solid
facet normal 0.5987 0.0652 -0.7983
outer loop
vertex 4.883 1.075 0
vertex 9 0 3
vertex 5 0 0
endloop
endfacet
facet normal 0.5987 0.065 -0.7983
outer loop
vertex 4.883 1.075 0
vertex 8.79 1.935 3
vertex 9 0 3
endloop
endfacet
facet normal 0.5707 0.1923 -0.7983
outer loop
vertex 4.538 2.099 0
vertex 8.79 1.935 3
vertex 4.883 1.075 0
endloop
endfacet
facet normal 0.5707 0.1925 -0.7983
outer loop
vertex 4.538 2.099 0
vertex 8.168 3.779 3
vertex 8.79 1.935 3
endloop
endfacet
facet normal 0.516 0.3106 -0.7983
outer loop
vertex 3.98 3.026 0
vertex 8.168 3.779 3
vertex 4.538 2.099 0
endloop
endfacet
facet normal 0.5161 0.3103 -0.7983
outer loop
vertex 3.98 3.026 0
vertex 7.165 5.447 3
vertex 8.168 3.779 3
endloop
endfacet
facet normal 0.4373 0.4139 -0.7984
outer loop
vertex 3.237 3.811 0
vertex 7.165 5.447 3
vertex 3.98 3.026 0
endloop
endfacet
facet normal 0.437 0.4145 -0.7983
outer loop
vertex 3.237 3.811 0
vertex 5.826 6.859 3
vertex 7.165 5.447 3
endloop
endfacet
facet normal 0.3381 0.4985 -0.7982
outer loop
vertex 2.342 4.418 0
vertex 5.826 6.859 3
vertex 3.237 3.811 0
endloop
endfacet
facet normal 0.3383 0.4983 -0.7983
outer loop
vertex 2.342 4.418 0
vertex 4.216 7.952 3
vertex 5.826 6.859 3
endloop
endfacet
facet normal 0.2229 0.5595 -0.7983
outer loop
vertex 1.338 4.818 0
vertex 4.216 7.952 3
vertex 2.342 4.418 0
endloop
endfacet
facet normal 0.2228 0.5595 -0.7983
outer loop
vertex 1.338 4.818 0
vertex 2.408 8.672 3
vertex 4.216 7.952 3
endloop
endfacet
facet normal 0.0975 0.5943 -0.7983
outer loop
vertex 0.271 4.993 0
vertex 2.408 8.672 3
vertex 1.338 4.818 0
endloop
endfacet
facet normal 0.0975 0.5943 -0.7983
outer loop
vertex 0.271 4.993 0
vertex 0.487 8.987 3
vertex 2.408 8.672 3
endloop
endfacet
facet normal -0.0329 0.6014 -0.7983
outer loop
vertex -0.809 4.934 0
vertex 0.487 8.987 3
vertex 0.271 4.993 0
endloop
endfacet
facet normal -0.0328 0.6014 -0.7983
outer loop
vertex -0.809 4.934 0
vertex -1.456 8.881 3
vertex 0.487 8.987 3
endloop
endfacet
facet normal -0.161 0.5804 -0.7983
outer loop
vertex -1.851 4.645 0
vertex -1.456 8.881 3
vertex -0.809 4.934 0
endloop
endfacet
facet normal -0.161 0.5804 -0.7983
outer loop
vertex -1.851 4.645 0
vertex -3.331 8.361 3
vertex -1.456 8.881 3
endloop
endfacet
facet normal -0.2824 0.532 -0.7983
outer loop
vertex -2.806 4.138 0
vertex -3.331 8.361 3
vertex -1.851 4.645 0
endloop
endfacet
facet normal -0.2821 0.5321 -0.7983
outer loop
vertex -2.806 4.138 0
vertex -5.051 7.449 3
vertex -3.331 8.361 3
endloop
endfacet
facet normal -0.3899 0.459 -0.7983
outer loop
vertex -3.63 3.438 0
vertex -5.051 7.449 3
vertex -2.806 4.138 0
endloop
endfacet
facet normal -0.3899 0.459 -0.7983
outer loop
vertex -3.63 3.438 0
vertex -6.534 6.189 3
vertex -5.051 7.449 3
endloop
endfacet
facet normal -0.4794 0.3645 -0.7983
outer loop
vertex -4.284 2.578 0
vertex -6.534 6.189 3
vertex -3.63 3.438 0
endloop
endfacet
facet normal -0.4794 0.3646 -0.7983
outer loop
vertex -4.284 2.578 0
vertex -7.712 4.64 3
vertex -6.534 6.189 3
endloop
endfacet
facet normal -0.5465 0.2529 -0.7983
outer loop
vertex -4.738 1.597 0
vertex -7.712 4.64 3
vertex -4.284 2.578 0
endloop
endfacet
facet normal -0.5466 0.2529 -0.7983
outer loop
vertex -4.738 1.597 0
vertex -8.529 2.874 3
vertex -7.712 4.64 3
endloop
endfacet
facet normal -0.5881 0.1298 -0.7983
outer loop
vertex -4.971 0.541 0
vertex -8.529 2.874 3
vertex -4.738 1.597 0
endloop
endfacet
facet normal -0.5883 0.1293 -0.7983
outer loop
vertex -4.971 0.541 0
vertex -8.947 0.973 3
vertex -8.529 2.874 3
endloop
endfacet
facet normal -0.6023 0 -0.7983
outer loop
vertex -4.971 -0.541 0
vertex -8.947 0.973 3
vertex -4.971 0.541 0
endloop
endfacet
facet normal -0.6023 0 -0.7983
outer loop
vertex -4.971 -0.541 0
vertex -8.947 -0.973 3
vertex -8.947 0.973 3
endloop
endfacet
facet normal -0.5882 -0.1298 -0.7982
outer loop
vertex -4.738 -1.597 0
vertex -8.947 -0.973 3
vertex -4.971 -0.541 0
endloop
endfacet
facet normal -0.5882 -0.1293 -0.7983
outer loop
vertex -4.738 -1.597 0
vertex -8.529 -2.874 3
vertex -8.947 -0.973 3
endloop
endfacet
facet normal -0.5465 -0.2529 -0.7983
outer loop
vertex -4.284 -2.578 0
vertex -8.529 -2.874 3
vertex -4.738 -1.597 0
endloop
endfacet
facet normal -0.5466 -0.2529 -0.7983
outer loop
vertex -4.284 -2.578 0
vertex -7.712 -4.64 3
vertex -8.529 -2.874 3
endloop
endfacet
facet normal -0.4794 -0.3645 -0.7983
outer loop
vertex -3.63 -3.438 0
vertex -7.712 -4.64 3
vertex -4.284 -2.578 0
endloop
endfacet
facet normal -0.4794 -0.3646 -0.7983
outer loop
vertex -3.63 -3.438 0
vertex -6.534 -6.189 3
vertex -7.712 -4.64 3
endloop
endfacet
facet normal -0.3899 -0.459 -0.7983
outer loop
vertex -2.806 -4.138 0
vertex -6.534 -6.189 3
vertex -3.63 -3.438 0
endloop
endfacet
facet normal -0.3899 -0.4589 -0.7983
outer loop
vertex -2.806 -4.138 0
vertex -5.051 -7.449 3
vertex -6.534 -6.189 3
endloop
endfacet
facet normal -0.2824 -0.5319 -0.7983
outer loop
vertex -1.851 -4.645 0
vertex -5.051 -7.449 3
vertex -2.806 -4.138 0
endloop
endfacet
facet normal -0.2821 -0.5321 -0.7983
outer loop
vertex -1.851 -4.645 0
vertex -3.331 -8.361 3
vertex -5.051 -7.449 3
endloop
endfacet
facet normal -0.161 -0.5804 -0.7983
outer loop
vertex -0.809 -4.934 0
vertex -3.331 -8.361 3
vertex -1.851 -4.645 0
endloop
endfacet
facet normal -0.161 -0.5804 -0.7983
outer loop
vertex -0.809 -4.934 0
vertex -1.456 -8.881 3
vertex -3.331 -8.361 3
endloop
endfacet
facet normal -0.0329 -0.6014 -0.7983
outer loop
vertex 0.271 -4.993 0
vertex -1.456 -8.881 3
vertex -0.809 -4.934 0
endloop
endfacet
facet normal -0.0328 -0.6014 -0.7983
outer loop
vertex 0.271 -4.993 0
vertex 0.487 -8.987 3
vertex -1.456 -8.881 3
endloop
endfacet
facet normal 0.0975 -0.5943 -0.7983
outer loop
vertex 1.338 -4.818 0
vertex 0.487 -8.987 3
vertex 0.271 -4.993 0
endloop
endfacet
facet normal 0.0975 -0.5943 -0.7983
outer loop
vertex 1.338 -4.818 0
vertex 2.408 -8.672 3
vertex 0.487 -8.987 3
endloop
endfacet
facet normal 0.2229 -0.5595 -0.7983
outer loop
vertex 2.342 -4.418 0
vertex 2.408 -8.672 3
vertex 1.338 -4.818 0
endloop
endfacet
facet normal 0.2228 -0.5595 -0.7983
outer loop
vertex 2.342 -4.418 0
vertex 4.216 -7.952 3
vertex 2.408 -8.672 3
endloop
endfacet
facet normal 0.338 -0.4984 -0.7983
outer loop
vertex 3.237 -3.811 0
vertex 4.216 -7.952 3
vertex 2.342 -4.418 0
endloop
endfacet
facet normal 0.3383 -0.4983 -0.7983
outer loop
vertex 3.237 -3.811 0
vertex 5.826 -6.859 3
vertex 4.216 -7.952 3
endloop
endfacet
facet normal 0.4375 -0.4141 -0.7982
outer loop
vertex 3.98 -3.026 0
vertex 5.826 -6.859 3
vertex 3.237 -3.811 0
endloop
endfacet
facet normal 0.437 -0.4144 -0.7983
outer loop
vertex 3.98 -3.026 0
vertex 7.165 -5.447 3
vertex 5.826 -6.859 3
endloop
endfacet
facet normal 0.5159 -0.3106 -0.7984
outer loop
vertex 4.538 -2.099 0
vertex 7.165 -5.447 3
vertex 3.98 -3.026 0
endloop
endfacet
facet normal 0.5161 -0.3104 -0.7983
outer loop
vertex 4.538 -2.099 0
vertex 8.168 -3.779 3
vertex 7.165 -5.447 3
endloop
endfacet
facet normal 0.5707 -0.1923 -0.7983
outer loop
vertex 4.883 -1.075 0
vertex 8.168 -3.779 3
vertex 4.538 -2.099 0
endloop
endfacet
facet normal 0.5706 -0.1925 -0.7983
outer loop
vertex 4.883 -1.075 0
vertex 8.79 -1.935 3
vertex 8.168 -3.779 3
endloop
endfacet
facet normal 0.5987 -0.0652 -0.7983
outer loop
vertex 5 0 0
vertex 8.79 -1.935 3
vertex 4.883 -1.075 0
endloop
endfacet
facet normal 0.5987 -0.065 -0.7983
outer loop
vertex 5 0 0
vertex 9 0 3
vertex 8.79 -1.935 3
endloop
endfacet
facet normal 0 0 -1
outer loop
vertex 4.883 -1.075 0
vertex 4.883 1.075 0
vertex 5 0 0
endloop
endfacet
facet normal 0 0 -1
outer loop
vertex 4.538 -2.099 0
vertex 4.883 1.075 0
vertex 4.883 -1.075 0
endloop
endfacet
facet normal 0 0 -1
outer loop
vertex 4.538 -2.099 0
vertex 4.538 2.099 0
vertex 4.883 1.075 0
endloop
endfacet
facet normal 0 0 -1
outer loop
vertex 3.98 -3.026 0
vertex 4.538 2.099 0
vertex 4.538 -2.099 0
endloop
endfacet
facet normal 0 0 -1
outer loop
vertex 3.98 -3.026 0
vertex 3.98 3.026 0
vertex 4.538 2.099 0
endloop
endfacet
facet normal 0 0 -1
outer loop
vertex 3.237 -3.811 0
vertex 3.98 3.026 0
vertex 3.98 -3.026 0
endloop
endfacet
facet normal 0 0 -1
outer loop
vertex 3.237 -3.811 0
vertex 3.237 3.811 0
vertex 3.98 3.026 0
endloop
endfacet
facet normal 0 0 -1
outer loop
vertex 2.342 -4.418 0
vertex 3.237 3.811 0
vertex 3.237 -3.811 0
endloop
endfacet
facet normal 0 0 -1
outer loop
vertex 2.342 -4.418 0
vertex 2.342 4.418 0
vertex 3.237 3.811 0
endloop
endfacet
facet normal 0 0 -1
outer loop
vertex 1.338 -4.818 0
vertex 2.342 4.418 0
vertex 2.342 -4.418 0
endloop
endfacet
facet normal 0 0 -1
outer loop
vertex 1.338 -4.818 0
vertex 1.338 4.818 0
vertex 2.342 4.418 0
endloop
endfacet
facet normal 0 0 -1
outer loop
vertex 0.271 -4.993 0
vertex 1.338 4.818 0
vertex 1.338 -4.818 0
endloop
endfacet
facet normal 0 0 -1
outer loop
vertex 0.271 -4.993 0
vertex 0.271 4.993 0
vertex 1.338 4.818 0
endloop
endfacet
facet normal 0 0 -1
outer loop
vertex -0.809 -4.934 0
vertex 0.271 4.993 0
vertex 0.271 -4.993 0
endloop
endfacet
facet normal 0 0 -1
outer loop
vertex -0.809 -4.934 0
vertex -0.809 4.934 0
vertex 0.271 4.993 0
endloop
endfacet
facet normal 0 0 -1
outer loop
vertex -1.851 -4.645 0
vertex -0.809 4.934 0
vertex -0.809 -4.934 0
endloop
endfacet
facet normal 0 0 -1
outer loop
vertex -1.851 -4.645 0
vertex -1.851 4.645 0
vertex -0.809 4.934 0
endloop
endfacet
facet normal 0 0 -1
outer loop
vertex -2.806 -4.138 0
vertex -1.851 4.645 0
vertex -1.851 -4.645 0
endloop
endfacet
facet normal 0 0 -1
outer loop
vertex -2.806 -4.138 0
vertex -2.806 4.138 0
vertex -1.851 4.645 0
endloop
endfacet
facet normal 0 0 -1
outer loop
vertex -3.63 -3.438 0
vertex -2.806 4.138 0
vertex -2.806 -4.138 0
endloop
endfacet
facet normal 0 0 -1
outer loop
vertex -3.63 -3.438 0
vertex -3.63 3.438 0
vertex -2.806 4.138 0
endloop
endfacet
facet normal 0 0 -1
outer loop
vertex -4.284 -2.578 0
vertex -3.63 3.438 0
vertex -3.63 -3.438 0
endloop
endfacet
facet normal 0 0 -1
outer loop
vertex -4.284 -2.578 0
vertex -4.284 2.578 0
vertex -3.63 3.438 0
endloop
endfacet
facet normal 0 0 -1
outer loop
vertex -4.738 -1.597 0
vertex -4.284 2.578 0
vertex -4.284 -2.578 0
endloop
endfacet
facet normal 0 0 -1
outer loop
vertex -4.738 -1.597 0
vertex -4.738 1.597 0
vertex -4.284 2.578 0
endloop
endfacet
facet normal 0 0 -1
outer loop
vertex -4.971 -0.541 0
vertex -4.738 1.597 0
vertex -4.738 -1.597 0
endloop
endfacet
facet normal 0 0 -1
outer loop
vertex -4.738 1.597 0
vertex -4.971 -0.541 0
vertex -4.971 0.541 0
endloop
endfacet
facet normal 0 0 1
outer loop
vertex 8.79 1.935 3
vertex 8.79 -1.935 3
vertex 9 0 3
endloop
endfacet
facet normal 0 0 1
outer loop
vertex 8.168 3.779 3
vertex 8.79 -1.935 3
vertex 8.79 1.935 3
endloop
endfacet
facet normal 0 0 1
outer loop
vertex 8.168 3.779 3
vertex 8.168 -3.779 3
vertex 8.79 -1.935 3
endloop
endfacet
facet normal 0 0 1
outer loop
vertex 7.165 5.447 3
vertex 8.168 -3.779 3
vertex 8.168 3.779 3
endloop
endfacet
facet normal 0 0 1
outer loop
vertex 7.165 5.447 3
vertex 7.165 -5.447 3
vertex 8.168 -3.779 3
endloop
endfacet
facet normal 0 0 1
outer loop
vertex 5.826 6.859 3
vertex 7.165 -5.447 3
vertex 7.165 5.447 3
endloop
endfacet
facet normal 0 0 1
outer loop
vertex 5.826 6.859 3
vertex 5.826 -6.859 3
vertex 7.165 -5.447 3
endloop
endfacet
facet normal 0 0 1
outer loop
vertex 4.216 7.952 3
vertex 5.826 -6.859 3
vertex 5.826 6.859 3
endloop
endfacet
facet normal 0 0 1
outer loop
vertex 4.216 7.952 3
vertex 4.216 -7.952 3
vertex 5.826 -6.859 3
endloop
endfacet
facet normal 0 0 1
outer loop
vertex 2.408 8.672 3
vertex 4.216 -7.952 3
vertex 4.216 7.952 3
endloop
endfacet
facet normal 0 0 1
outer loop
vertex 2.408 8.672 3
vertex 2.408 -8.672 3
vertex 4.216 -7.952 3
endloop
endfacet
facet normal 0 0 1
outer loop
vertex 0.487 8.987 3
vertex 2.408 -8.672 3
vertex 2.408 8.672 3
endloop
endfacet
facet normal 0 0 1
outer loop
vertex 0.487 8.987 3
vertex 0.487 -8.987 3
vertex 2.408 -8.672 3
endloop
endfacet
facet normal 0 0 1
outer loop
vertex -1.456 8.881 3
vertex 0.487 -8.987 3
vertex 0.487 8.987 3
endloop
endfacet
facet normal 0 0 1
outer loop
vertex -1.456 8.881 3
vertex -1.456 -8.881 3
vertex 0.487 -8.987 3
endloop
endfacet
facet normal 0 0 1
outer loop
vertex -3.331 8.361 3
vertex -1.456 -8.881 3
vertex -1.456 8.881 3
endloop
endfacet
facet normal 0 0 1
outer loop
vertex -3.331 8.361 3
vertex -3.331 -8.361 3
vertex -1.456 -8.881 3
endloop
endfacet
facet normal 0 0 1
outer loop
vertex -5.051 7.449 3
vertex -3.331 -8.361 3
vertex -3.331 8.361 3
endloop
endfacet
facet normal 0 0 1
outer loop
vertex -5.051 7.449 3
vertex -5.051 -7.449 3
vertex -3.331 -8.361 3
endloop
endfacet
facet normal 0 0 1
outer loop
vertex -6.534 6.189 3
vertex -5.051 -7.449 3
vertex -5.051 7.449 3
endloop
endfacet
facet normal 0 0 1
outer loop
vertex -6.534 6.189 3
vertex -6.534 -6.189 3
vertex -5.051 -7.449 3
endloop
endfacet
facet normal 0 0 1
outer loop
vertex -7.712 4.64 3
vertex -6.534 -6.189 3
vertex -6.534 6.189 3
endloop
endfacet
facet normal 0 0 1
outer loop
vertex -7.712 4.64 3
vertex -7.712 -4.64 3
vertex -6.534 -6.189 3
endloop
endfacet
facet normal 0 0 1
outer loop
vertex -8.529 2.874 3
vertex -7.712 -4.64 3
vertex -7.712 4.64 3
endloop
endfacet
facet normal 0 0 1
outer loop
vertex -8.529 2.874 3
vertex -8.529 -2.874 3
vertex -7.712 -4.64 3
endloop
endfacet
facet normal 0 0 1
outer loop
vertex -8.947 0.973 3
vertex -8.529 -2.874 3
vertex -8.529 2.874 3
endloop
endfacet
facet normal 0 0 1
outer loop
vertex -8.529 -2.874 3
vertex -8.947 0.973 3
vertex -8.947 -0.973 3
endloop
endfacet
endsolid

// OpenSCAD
// Generated by SolidPython 1.0.1 on 2020-07-28 23:56:47


cylinder(h = 3, r1 = 5, r2 = 9);
/***********************************************
*********      SolidPython code:      **********
************************************************
 
# import packages: SolidPython
from solid import *
from solid.utils import *
from itertools import chain, combinations


class Resize:

    def __init__(self, scad_file):
        self.scad_file = scad_file
        #self.scad_file = import_scad(scad_file)
        # cone/cylinder param:
        self.r1 = 0
        self.r2 = 0
        self.h = 0
        # rectangular prism param:
        self.w = 0
        self.l = 0
        # ellipse param:
        self.r = 0

    # import OpenScad code (file name corresponds to shape)


    # classify shape + parameters
    def assign(self, param1, param2, param3):
        if self.scad_file == 'cone.scad':
            self.r1 = param1
            self.r2 = param2
            self.h = param3
        elif self.scad_file == 'cylinder.scad':
            self.r1 = param1
            self.r2 = param2
            self.h = param3
        elif self.scad_file == 'rectangularPrism.scad':
            self.h = param1
            self.l = param2
            self.w = param3
        else:
            self.r = param1
            self.h = param2

    # resize parameters
    def iterate(self):
        x = range(3, 20, 2)
        i = 1
        if self.scad_file == 'cone.scad':
            tempList = list(combinations(x, 3))
            print(tempList)
            for i in range(0, 3):
                param1 = tempList[i][0]
                param2 = tempList[i][1]
                param3 = tempList[i][2]
                filepath = 'produced_scad_files/' + 'cone' + str(param1) + '_' + str(param2) + '_' + str(param3) + '.scad'
                scad_render_to_file(cylinder(h=param1, r1=param2, r2=param3), filepath)

        elif self.scad_file == 'cylinder.scad':
            tempList = list(combinations(x, 3))
            for i in range(0, 3):
                param1 = tempList[i][0]
                param2 = tempList[i][1]
                param3 = tempList[i][2]
                filepath = 'produced_scad_files/' + 'cylinder' + str(param1) + '_' + str(param2) + '_' + str(param3) + '.scad'
                scad_render_to_file(cylinder(h=param1, r1=param2, r2=param3), filepath)

        elif self.scad_file == 'rectangularPrism.scad':
            tempList = list(combinations(x, 3))
            for i in range(0, 3):
                param1 = tempList[i][0]
                param2 = tempList[i][1]
                param3 = tempList[i][2]
                filepath = 'produced_scad_files/' + 'rectangularPrism' + str(param1) + '_' + str(param2) + '_' + str(
                    param3) + '.scad'
                scad_render_to_file(cube(size=(param1, param2, param3)), filepath)

        else:
            tempList = list(combinations(x, 2))
            for i in range(0, 2):
                param1 = tempList[i][0]
                param2 = tempList[i][1]
                filepath = 'produced_scad_files/' + 'ellipse' + str(param1) + '_' + str(param2) + '_' + '.scad'
                scad_render_to_file(sphere(param1, param2), filepath)

    def render_to_scadfile(self):
        scad_render_to_file(scad, 'example.scad') 
 
************************************************/
